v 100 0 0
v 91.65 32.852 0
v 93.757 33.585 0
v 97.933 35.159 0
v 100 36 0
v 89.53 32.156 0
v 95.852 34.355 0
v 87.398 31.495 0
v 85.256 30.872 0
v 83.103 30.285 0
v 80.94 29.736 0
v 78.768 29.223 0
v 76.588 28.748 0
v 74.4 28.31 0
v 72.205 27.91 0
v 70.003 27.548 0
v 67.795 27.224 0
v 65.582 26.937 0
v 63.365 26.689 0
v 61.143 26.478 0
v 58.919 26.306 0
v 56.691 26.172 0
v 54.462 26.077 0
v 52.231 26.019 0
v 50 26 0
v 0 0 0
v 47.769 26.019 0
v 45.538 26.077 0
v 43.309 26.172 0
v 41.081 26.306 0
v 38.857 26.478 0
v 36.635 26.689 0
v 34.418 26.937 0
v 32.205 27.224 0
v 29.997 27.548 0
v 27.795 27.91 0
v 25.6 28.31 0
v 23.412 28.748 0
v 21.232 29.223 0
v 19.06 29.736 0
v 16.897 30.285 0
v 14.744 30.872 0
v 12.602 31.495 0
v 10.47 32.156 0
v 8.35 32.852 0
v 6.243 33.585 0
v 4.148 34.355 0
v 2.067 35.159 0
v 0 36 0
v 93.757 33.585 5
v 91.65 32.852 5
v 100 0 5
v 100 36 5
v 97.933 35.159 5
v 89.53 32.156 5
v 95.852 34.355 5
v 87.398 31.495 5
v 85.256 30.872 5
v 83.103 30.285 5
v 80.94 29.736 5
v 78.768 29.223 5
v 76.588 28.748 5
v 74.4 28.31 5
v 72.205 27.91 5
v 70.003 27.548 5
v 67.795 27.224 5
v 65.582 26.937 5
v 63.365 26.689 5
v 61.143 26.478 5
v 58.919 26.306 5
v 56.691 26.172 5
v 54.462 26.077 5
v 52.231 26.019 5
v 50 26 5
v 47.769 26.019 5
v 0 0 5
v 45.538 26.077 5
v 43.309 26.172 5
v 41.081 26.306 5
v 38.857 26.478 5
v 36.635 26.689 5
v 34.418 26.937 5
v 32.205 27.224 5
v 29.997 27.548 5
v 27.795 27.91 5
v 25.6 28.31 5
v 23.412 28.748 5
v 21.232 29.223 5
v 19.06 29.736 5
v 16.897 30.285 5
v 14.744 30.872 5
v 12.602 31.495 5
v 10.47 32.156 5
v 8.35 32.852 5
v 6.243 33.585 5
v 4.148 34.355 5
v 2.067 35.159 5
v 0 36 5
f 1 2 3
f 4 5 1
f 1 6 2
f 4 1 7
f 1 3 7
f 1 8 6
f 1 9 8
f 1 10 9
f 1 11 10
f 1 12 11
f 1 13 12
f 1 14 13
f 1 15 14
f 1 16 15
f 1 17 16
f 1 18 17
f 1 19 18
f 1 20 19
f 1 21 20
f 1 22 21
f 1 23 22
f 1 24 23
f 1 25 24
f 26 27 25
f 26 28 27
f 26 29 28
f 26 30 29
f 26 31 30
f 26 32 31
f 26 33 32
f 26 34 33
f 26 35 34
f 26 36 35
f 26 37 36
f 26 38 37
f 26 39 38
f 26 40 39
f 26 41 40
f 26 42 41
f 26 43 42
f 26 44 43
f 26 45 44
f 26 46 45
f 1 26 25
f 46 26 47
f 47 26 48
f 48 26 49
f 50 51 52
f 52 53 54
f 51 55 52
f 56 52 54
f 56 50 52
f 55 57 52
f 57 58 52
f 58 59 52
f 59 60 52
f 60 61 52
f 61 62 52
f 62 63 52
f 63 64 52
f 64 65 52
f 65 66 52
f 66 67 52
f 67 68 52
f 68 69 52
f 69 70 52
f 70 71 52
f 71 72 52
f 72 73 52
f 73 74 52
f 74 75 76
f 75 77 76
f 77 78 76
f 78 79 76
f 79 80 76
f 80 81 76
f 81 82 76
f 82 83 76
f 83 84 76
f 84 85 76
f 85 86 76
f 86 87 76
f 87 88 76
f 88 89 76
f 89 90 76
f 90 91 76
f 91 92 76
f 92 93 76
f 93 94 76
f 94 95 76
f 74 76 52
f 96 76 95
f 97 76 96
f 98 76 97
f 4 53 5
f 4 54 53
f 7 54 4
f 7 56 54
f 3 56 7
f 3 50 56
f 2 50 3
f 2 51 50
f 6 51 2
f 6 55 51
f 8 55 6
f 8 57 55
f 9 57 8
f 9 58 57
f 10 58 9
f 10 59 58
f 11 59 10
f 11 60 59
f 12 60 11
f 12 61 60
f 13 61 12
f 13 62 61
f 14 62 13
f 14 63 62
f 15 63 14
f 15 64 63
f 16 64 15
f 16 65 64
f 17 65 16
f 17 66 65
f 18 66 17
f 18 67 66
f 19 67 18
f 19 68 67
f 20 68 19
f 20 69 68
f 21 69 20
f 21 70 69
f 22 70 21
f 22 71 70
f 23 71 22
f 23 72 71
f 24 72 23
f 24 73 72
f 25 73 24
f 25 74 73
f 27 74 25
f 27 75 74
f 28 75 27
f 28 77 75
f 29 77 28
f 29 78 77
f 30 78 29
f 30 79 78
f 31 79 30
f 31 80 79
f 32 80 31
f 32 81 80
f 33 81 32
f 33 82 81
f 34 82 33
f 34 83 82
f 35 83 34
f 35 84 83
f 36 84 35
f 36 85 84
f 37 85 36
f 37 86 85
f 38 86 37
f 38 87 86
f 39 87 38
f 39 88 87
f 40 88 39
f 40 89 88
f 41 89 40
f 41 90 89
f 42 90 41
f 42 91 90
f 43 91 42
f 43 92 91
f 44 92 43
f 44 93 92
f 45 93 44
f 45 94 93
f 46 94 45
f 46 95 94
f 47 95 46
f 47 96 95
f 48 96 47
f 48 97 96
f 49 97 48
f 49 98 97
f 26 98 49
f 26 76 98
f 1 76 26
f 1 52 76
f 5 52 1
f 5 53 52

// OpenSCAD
$fn = 32;

// ----------------------------------------------------------------------
// Arc profile plate: notch, 49 points
// ----------------------------------------------------------------------

// --- parameters (mm) ---
bar_l = 100;              // bar length, X
bar_w = 36;               // bar width, Y
notch_depth = 10;         // depth of the arc notch at mid-span
arc_r = 130;              // radius of the notch arc
arc_angle = 45.24;        // notch arc angle, degrees
arc_step = 1;             // sampling step of the notch arc, degrees
plate_t = 5;              // plate thickness, Z

profile = [[0, 0], [100, 0], [100, 36], [97.933, 35.159], [95.852, 34.355], [93.757, 33.585], [91.65, 32.852], [89.53, 32.156], [87.398, 31.495], [85.256, 30.872], [83.103, 30.285], [80.94, 29.736], [78.768, 29.223], [76.588, 28.748], [74.4, 28.31], [72.205, 27.91], [70.003, 27.548], [67.795, 27.224], [65.582, 26.937], [63.365, 26.689], [61.143, 26.478], [58.919, 26.306], [56.691, 26.172], [54.462, 26.077], [52.231, 26.019], [50, 26], [47.769, 26.019], [45.538, 26.077], [43.309, 26.172], [41.081, 26.306], [38.857, 26.478], [36.635, 26.689], [34.418, 26.937], [32.205, 27.224], [29.997, 27.548], [27.795, 27.91], [25.6, 28.31], [23.412, 28.748], [21.232, 29.223], [19.06, 29.736], [16.897, 30.285], [14.744, 30.872], [12.602, 31.495], [10.47, 32.156], [8.35, 32.852], [6.243, 33.585], [4.148, 34.355], [2.067, 35.159], [0, 36]];  // primary outline, 49 points, counter clockwise

// --- the one profile operation ---
linear_extrude(height = plate_t) polygon(points = profile);
